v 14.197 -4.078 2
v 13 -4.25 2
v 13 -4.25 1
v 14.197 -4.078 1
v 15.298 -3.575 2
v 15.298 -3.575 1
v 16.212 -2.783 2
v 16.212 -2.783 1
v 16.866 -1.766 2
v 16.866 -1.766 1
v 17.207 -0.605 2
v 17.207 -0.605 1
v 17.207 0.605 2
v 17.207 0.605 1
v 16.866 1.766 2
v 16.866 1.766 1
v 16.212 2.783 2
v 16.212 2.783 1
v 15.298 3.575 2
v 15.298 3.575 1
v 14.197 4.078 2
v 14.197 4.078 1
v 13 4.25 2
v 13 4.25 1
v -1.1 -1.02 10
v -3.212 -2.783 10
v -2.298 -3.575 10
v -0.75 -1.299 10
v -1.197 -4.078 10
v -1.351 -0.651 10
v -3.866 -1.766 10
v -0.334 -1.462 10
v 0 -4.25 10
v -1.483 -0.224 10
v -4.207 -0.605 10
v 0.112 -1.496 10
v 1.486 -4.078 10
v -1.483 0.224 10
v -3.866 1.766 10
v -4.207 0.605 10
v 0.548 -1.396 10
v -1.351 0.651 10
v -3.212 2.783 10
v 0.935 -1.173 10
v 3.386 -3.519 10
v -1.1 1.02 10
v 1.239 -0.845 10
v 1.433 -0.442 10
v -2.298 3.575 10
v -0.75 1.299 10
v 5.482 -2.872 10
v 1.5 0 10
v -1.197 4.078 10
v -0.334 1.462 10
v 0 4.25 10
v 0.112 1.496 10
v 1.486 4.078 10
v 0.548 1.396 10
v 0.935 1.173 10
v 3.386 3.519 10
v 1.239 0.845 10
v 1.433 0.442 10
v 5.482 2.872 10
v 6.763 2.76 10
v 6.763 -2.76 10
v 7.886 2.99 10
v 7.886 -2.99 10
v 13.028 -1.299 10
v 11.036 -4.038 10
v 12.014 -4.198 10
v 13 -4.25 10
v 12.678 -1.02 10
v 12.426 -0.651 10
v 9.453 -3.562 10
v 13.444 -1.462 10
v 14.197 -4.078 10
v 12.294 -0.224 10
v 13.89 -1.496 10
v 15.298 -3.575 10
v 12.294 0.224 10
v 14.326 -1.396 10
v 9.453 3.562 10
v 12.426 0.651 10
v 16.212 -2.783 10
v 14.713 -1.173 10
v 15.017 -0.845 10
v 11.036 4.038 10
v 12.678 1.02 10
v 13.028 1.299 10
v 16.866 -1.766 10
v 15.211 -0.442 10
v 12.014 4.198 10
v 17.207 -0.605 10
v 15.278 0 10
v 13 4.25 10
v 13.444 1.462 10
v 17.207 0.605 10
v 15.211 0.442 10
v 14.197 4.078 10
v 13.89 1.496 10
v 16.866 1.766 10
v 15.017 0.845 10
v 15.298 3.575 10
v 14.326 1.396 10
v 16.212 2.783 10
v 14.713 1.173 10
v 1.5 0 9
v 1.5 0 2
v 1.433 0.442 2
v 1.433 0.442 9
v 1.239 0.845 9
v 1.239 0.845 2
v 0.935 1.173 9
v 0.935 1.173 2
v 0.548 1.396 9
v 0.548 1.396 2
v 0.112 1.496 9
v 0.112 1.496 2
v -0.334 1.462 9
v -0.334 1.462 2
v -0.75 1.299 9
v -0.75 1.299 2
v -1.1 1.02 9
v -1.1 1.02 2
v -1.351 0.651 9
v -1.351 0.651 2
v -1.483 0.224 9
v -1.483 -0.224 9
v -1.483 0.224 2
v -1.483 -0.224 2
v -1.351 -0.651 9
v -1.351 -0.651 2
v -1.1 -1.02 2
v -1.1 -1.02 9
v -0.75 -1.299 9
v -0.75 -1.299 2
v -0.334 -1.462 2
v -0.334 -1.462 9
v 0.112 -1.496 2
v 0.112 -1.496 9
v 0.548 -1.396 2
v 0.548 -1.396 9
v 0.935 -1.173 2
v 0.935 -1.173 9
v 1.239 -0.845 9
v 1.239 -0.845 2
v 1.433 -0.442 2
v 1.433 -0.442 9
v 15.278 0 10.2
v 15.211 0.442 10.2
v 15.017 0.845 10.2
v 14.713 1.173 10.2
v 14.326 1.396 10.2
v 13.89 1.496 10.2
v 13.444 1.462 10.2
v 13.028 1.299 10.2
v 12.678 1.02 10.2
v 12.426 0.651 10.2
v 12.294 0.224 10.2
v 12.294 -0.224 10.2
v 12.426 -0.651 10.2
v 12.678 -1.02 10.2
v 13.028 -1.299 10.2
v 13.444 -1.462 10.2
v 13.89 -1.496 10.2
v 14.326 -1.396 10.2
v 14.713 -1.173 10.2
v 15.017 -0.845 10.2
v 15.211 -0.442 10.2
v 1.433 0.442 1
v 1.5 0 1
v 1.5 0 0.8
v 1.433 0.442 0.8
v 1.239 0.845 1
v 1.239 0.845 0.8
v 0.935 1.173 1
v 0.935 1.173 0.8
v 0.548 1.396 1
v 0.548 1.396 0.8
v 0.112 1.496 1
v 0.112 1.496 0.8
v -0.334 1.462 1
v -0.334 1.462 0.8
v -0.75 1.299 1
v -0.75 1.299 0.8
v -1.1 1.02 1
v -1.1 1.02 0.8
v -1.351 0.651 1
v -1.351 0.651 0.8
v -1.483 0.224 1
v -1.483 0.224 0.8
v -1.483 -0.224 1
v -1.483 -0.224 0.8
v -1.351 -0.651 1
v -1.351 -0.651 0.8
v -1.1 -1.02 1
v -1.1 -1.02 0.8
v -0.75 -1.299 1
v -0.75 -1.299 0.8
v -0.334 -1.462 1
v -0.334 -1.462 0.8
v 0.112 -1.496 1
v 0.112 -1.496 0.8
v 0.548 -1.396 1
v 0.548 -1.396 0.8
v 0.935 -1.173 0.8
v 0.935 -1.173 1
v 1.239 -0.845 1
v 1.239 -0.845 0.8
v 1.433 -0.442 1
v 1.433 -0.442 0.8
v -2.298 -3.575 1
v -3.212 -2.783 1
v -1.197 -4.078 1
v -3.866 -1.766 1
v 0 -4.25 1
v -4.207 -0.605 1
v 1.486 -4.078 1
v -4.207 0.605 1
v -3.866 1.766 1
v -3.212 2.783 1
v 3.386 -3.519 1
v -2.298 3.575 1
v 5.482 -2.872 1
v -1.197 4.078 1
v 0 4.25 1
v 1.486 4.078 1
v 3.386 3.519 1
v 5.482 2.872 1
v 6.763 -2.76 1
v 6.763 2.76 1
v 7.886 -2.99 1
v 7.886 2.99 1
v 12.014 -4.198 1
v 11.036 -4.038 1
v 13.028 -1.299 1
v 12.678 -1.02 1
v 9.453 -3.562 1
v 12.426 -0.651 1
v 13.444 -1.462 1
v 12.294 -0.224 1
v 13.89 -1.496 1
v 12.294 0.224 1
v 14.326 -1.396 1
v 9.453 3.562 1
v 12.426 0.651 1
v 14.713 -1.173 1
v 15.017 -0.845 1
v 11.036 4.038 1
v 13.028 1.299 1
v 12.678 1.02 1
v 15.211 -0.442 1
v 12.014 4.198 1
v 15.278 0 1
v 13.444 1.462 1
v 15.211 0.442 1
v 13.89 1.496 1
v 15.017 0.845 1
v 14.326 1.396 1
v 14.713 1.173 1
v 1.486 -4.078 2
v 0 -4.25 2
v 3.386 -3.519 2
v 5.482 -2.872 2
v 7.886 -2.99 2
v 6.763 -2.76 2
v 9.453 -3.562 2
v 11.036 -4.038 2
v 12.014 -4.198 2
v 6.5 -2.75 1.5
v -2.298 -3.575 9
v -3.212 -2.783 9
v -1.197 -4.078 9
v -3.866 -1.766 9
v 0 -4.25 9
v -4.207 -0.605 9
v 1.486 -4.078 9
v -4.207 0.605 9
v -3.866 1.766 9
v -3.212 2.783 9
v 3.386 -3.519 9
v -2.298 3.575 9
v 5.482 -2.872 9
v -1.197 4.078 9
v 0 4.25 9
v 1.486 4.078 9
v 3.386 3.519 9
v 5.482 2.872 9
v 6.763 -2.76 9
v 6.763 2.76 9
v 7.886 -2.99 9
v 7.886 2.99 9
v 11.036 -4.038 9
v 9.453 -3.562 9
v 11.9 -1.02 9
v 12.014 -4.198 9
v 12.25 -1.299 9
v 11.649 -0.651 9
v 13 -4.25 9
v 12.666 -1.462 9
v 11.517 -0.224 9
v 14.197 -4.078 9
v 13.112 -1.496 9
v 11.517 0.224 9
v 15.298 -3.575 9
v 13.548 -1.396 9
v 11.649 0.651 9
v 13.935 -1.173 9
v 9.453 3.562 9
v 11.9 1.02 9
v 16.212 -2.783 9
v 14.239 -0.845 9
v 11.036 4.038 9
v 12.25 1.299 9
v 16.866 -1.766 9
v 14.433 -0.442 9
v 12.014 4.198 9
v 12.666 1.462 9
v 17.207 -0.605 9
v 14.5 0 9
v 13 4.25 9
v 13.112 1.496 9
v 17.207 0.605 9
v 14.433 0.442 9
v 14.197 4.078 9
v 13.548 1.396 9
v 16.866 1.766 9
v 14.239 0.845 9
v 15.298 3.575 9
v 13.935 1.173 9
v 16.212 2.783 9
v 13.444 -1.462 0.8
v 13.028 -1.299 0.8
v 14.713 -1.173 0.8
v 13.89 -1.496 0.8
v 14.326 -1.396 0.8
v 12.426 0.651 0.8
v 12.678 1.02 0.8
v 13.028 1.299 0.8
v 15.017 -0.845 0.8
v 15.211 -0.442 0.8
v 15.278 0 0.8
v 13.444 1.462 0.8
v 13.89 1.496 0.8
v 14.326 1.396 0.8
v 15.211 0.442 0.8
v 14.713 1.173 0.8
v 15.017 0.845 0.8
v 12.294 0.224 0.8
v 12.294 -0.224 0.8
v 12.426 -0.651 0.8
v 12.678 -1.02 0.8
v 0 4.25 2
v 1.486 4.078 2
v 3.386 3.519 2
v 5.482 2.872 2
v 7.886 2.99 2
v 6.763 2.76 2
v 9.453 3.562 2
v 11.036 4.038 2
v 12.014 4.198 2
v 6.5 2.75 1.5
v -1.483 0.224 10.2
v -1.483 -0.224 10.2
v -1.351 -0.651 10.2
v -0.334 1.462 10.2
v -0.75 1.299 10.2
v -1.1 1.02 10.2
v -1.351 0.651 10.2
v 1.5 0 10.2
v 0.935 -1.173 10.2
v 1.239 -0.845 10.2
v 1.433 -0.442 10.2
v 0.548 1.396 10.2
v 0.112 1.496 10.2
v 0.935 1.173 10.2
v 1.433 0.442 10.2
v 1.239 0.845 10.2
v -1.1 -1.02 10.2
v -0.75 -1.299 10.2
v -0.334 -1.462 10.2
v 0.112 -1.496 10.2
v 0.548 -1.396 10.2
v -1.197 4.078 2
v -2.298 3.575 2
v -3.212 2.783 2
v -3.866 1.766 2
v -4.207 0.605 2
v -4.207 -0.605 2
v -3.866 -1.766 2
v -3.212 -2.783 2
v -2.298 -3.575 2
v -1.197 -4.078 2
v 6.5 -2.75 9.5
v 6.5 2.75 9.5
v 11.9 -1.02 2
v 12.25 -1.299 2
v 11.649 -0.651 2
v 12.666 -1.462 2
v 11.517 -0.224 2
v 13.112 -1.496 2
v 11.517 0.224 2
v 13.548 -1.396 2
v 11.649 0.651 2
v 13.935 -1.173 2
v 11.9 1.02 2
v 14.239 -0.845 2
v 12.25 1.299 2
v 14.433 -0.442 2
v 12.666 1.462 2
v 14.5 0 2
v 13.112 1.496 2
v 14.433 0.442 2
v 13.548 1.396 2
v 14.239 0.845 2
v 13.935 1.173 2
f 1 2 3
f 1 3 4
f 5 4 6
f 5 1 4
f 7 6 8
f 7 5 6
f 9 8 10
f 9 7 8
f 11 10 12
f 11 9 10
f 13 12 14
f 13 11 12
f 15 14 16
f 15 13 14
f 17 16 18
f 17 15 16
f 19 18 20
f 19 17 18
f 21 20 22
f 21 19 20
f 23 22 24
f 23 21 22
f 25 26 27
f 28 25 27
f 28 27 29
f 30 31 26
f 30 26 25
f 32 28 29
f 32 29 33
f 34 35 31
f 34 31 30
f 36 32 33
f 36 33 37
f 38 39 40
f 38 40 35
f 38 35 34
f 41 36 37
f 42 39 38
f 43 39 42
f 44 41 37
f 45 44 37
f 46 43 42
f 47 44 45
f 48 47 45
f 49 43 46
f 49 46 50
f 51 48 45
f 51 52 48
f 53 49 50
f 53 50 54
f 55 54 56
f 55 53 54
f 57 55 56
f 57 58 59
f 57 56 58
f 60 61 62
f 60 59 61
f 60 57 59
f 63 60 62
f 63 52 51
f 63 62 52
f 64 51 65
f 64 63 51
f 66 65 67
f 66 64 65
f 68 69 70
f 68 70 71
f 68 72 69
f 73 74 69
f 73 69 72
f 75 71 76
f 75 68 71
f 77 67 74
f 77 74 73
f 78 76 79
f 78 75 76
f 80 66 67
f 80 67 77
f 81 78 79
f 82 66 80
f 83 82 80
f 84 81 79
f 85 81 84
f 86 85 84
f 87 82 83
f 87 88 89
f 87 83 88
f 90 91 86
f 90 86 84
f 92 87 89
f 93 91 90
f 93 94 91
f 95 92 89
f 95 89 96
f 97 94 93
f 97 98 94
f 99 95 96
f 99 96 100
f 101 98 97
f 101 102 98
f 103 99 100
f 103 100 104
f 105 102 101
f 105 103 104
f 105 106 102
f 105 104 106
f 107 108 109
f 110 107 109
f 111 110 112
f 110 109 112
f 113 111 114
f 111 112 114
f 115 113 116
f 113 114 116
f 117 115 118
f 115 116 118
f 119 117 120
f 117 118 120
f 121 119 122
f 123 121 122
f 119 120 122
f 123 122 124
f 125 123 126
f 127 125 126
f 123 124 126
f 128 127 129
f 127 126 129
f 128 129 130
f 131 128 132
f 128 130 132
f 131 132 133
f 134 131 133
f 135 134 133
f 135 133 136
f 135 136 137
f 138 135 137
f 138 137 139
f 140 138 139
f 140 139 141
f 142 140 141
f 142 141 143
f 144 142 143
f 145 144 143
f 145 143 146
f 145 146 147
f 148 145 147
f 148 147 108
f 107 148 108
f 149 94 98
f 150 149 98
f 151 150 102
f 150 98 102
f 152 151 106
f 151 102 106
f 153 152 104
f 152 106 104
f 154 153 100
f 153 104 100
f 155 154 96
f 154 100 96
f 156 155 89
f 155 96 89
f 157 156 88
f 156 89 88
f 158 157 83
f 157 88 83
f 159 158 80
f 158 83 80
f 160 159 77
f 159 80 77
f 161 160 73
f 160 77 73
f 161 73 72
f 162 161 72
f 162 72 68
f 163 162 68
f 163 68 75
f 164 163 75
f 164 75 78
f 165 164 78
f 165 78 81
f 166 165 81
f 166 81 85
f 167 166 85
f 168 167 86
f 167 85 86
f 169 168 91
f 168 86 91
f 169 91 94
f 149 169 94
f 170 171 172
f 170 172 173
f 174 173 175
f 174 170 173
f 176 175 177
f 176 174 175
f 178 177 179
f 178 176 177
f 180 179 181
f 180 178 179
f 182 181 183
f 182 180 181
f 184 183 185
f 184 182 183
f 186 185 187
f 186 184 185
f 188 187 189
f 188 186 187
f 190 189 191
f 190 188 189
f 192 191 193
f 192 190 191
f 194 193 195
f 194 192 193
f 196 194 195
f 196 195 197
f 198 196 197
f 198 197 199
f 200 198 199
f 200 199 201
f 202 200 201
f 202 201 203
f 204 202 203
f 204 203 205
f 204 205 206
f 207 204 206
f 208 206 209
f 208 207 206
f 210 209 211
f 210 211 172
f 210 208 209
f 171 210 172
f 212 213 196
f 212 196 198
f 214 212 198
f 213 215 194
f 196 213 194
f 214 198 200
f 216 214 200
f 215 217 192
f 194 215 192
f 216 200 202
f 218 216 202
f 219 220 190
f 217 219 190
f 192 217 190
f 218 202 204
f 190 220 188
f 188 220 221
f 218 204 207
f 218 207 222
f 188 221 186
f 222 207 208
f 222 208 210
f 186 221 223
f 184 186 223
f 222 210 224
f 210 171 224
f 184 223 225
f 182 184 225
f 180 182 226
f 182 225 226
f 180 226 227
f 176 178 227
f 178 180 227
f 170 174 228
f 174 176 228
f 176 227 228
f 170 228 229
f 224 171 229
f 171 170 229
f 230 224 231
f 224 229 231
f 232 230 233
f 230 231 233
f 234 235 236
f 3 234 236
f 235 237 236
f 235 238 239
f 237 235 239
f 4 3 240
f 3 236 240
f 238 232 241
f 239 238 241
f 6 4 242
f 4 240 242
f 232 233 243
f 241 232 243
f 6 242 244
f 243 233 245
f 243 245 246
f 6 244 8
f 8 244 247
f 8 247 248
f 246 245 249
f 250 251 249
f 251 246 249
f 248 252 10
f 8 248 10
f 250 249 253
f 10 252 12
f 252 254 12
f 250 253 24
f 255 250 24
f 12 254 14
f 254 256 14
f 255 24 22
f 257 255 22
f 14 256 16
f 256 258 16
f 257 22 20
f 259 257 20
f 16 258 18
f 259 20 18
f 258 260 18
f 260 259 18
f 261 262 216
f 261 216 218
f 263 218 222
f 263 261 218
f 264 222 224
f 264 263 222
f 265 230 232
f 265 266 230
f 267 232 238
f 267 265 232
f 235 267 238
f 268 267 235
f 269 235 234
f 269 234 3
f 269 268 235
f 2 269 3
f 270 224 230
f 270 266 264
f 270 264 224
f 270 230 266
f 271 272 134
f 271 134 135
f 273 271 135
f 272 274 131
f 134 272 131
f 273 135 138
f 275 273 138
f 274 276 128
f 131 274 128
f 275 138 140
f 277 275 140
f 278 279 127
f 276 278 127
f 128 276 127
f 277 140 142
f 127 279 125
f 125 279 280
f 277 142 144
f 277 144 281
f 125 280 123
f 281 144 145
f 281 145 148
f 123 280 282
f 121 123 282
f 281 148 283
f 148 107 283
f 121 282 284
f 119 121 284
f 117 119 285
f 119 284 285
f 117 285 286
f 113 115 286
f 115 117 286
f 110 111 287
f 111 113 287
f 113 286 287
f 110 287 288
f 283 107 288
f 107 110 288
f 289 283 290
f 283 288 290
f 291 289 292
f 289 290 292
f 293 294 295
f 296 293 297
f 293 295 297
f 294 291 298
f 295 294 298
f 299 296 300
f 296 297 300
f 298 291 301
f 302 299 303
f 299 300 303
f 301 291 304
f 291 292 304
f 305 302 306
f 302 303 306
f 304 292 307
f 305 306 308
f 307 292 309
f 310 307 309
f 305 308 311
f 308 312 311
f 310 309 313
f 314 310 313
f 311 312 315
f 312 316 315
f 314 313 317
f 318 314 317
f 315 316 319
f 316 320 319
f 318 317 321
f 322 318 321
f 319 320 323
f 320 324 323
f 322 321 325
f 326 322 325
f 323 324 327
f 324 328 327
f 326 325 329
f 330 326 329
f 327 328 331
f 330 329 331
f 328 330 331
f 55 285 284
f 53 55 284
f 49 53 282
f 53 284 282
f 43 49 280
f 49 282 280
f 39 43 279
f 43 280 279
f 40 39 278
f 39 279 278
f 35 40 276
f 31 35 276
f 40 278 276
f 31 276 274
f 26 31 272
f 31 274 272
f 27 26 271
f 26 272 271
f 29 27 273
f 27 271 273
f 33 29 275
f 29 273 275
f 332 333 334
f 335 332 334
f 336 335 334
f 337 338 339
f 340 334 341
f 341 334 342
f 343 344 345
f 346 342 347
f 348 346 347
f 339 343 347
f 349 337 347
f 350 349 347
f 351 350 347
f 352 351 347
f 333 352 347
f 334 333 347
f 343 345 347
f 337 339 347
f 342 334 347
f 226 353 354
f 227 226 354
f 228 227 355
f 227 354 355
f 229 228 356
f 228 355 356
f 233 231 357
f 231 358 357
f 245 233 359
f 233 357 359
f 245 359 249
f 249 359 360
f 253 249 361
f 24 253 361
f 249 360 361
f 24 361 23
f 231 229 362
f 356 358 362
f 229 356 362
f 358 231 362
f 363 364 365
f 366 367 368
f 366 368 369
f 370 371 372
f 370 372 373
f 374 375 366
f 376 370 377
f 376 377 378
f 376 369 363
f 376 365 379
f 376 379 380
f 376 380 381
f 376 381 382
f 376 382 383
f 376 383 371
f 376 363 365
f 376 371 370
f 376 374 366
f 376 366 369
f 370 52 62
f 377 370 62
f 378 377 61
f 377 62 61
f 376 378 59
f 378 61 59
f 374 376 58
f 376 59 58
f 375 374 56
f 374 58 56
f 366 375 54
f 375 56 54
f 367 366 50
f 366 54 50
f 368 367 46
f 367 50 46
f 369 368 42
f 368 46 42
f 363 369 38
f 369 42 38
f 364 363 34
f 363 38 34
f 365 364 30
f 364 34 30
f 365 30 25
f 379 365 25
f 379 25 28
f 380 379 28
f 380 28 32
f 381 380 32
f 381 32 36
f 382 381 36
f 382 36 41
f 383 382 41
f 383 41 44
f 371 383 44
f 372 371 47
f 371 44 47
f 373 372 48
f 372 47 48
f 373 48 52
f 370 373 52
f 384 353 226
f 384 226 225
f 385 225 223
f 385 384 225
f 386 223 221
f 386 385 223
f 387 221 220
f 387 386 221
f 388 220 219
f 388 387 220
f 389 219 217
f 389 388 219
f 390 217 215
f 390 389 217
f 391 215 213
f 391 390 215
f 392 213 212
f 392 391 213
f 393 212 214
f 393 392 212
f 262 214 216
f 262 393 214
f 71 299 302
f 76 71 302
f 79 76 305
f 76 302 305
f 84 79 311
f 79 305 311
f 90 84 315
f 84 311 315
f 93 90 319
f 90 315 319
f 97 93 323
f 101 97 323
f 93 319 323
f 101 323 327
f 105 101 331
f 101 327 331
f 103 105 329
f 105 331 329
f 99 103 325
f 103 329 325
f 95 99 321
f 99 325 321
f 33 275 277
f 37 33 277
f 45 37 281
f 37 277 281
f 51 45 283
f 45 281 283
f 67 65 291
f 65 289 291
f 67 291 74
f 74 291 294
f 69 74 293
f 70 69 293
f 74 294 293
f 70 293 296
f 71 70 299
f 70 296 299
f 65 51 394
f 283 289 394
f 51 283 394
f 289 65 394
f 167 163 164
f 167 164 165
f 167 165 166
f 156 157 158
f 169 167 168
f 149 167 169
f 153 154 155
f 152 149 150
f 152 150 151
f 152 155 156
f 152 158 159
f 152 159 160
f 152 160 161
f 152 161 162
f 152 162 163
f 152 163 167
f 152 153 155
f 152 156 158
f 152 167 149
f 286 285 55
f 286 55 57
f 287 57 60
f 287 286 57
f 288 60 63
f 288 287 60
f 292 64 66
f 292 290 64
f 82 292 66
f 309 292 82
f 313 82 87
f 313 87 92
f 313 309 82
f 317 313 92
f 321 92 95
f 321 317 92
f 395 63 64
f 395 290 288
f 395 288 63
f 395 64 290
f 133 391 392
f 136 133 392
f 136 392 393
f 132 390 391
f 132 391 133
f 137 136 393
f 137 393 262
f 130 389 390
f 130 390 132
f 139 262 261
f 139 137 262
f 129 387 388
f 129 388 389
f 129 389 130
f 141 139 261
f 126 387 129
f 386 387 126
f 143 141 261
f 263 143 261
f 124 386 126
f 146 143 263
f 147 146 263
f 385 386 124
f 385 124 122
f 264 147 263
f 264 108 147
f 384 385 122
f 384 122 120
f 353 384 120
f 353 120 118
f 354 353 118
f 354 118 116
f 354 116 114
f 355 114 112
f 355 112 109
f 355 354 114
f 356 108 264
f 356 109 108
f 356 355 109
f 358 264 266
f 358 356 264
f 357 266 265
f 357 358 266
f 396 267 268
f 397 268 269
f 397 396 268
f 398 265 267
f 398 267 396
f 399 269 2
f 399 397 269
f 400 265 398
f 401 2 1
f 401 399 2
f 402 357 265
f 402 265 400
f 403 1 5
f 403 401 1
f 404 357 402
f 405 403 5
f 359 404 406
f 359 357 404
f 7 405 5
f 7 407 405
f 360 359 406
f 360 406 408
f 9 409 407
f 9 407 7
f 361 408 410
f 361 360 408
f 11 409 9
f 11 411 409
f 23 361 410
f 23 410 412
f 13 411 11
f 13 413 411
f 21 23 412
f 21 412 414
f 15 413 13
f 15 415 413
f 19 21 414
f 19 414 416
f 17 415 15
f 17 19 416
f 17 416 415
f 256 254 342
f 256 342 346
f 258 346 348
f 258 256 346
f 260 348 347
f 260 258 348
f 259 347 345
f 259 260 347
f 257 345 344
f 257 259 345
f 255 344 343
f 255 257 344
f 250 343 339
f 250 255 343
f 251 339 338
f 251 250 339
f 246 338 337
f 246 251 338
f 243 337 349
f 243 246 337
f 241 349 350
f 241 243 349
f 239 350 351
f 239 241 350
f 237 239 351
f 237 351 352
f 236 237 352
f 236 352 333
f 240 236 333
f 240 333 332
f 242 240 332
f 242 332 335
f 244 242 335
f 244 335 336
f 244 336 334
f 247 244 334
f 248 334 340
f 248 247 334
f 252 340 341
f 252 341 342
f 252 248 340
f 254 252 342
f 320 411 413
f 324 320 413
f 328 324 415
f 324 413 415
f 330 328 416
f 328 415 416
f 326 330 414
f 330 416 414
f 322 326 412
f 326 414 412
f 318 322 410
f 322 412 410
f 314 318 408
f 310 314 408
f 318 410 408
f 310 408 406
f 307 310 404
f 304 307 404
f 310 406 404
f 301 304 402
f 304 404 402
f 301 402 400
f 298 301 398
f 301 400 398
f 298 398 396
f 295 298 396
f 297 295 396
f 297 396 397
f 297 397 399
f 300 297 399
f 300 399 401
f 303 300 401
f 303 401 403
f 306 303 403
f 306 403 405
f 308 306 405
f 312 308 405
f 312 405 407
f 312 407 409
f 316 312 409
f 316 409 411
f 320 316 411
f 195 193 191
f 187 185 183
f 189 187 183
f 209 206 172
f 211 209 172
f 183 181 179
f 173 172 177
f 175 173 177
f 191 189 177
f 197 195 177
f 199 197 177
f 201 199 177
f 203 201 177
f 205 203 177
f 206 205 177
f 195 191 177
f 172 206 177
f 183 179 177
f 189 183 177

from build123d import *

# Parameters (mm, degrees)
SKETCH1_R               = 1.5
BOSS_EXTRUDE6_DEPTH     = 9
BOSS_EXTRUDE6_2_DEPTH   = 9
BOSS_EXTRUDE7_DEPTH     = 1
SKETCH6_R               = 1.5
BOSS_EXTRUDE8_DEPTH     = 0.2
CUT_EXTRUDE1_DEPTH      = 21.485726843
CUT_EXTRUDE1_DEPTH_BACK = 21.485726843


with BuildPart() as part:
    # Sketch1 → Boss-Extrude6 (new body)
    with BuildSketch(Plane.XY):
        Circle(SKETCH1_R)
    extrude(amount=BOSS_EXTRUDE6_DEPTH)



with BuildPart() as body_2:
    # Sketch1 → Boss-Extrude6 2 (new body)
    with BuildSketch(Plane.XY):
        with Locations((13, 0)):
            Circle(SKETCH1_R)
    extrude(amount=BOSS_EXTRUDE6_2_DEPTH)


with BuildPart() as part_1:
    add(part.part)

    add(body_2.part)  # Boss-Extrude7 merges body 2
    # Sketch5 → Boss-Extrude7 (add)
    with BuildSketch(Plane.XY.offset(9)):
        with BuildLine():
            ThreePointArc((0, 4.25), (-4.25, 0), (0, -4.25))
            add(Edge.make_bspline(
                [(0, -4.25), (2.386303511, -4.25), (6.863643386, -1.25), (9.886409718, -4.25), (13, -4.25)],
                knots=[0, 0, 0, 0, 0.5, 1, 1, 1, 1], degree=3))
            ThreePointArc((13, -4.25), (17.25, 0), (13, 4.25))
            add(Edge.make_bspline(
                [(0, 4.25), (2.386303511, 4.25), (6.863643386, 1.25), (9.886409718, 4.25), (13, 4.25)],
                knots=[0, 0, 0, 0, 0.5, 1, 1, 1, 1], degree=3))
        make_face()
    boss_extrude7 = extrude(amount=BOSS_EXTRUDE7_DEPTH)

    # Sketch6 → Boss-Extrude8 (add)
    with BuildSketch(Plane.XY.offset(10)):
        Circle(SKETCH6_R)
        with Locations((13.777718246, 0)):
            Circle(SKETCH6_R)
    boss_extrude8 = extrude(amount=BOSS_EXTRUDE8_DEPTH)

    # Sketch8 → Cut-Extrude1 (cut, two sides: drawn at the far end of the back side and taken through both)
    with BuildSketch(Plane(origin=(0, 0, 0), x_dir=(0, 0, -1), z_dir=(1, 0, 0)).offset(-CUT_EXTRUDE1_DEPTH_BACK)):
        Polygon((0, 0), (0, 2.418260543), (-2, 2.418260543), (-2, -2.301811822), (0, -2.301811822), align=None)
    extrude(amount=CUT_EXTRUDE1_DEPTH + CUT_EXTRUDE1_DEPTH_BACK, mode=Mode.SUBTRACT)

    # Mirror1: Boss-Extrude7, Boss-Extrude8 across plane
    add(boss_extrude7.mirror(Plane(origin=(0, 0, 5.5), x_dir=(1, 0, 0), z_dir=(0, 0, -1))))
    add(boss_extrude8.mirror(Plane(origin=(0, 0, 5.5), x_dir=(1, 0, 0), z_dir=(0, 0, -1))))


solid = part_1.part
